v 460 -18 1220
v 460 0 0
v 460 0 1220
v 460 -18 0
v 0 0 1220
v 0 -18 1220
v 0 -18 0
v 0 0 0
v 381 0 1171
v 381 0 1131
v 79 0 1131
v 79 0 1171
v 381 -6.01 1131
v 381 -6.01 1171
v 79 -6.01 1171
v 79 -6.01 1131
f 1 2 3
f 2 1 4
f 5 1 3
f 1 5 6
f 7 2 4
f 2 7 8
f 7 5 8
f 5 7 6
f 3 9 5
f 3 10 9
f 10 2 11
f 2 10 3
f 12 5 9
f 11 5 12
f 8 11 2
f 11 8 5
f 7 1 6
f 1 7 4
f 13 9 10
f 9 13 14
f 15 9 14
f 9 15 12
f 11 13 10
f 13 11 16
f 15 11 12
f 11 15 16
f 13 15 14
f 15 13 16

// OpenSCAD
// file: ../components/backing_panel.scad
//
// Generic backing panel with optional routed recesses in the back face.
//
// Local coordinate system:
// - X: left to right
// - Y: back face at Y = 0, front projects towards negative Y
// - Z: bottom to top
//
// recesses: [x, z, width, height, depth]
//

module backing_panel(
    width,
    height,
    thickness,
    recesses = []
) {
    difference() {
        translate([0, -thickness, 0])
            cube([width, thickness, height]);

        for (r = recesses) {
            recess_x      = r[0];
            recess_z      = r[1];
            recess_width  = r[2];
            recess_height = r[3];
            recess_depth  = r[4];

            // Pocket is routed from the back face into the panel.
            translate([
                recess_x,
                -recess_depth - 0.01,
                recess_z
            ])
                cube([
                    recess_width,
                    recess_depth + 0.02,
                    recess_height
                ]);
        }
    }
}
// file: ../config.scad
//
// Garage layout - configuration
// Units: millimetres
//

$fn = 48;


/* [View] */

show_rear_wall           = true;
show_left_wall           = true;
show_window_frame        = true;
show_door_frame          = true;
show_window_sill         = true;
show_workbench           = true;
show_floor               = true;
show_tool_backing_panels = true;
show_skadis_panels       = true;
show_tool_panel_mounts   = true;
show_skadis_slot_pattern = true;
show_skadis_mount_points = true;
show_skadis_mount_hardware = false;

// Move multiplex + SKADIS towards the garage to inspect the concealed mount.
tool_panel_explode = 0; // [0:5:150]


/* [Garage walls] */

wall_width     = 3800;
wall_height    = 2600;

// Concrete / structural inner shell only.
// Additional exterior wall layers can be added later.
wall_thickness = 90;

// Temporary left-wall depth follows the currently modelled floor depth.
// This will become the measured garage depth later.
left_wall_depth = 2000;


/* [Window opening] */

// Inside view: measured from the left side of the rear wall.
window_left_offset = 480;
window_width       = 780;
window_height      = 1340;
window_top_offset  = 200;

window_bottom = wall_height - window_top_offset - window_height;


/* [Window sill] */

// Projection into the garage from the inside face of the wall.
window_sill_thickness  = 20;
window_sill_depth      = 20;
window_sill_side_extra = 20;


/* [Door opening] */

// Horizontal distance between the right side of the window opening
// and the left side of the door opening.
window_to_door = 740;

// Width is provisional until measured.
door_width  = 900;
door_height = 2300;

door_left = window_left_offset + window_width + window_to_door;


/* [Exterior frames] */

// Simplified visualization. Both frames sit on the exterior side
// of the 90 mm concrete wall.
frame_border = 50;
frame_depth  = 60;


/* [Workbench] */

workbench_width  = 1500;
workbench_depth  = 750;
workbench_height = 990;

workbench_top_thickness = 40;
workbench_leg_size      = 70;
workbench_leg_inset     = 60;

// Inside view: workbench starts at the left end of the rear wall.
workbench_x = 0;


/* [Tool panel backing] */

// Use the 1220 mm sheet dimension directly. The backing panels are centred
// vertically on the window opening instead of being made as tall as the window.
tool_panel_height = 1220;
tool_panel_bottom = window_bottom + (window_height - tool_panel_height) / 2;
tool_panel_top    = tool_panel_bottom + tool_panel_height;

tool_panel_thickness = 18;

// Left wall strip is 480 mm; keep 10 mm free on each side.
left_tool_panel_width = 460;
left_tool_panel_x = (window_left_offset - left_tool_panel_width) / 2;

// Right wall strip between window and door is 740 mm; keep 10 mm each side.
right_tool_panel_width = 720;
right_tool_panel_x =
    window_left_offset + window_width
    + (window_to_door - right_tool_panel_width) / 2;


/* [SKADIS] */

skadis_width  = 360;
skadis_height = 560;
skadis_thickness = 5;

// Approximate stand-off created by the original IKEA wall rail/spacers.
skadis_mount_gap = 15;

// Geometry used for the recognisable SKADIS pattern.
skadis_corner_radius = 9;
skadis_slot_width    = 5;
skadis_slot_height   = 15;
skadis_grid_pitch    = 40;
skadis_grid_offset   = 20;

// The 36 cm board uses the supplied 20 cm wall rail. The four visible board
// fasteners are modelled at the corresponding left/right positions.
skadis_rail_length = 200;
skadis_mount_point_z_inset = 20;
skadis_mount_head_diameter = 12;
skadis_mount_head_depth = 2;


/* [Tool panel mounting - Ropro] */

// Ropro Heavy Duty French Cleat / Z-bar known dimensions.
cleat_profile_height = 38;
cleat_wall_distance  = 6;

// Route the full wall-rail envelope into the back of the 18 mm multiplex.
// This leaves 12 mm of multiplex below the recess and must be considered
// when selecting screws for the panel-side counter profile.
cleat_recess_depth = 6;
cleat_recess_clearance = 1;

// Position rail near the upper edge, safely above the panel centre of gravity.
cleat_top_inset = 50;

// Left panel: Ropro Heavy Duty 30 cm set (300 + 300 mm).
left_cleat_wall_length  = 300;
left_cleat_panel_length = 300;

// Right panel: Ropro Heavy Duty 60+6 cm set:
// 600 mm wall rail + two 60 mm panel-side counter profiles.
right_cleat_wall_length = 600;
right_cleat_panel_piece_length = 60;


/* [Floor] */

// Temporary depth until the complete garage depth is measured.
floor_depth     = 2000;
floor_thickness = 100;
// main file
// Export entry point: left 460 x 1360 x 18 mm multiplex backing panel.

include <../config.scad>
include <../components/backing_panel.scad>

recess_width = left_cleat_wall_length + 2 * cleat_recess_clearance;
recess_height = cleat_profile_height + 2 * cleat_recess_clearance;
recess_x = (left_tool_panel_width - recess_width) / 2;
cleat_z = tool_panel_height - cleat_top_inset - cleat_profile_height;
recess_z = cleat_z - cleat_recess_clearance;

backing_panel(
    width = left_tool_panel_width,
    height = tool_panel_height,
    thickness = tool_panel_thickness,
    recesses = [[
        recess_x,
        recess_z,
        recess_width,
        recess_height,
        cleat_recess_depth
    ]]
);
